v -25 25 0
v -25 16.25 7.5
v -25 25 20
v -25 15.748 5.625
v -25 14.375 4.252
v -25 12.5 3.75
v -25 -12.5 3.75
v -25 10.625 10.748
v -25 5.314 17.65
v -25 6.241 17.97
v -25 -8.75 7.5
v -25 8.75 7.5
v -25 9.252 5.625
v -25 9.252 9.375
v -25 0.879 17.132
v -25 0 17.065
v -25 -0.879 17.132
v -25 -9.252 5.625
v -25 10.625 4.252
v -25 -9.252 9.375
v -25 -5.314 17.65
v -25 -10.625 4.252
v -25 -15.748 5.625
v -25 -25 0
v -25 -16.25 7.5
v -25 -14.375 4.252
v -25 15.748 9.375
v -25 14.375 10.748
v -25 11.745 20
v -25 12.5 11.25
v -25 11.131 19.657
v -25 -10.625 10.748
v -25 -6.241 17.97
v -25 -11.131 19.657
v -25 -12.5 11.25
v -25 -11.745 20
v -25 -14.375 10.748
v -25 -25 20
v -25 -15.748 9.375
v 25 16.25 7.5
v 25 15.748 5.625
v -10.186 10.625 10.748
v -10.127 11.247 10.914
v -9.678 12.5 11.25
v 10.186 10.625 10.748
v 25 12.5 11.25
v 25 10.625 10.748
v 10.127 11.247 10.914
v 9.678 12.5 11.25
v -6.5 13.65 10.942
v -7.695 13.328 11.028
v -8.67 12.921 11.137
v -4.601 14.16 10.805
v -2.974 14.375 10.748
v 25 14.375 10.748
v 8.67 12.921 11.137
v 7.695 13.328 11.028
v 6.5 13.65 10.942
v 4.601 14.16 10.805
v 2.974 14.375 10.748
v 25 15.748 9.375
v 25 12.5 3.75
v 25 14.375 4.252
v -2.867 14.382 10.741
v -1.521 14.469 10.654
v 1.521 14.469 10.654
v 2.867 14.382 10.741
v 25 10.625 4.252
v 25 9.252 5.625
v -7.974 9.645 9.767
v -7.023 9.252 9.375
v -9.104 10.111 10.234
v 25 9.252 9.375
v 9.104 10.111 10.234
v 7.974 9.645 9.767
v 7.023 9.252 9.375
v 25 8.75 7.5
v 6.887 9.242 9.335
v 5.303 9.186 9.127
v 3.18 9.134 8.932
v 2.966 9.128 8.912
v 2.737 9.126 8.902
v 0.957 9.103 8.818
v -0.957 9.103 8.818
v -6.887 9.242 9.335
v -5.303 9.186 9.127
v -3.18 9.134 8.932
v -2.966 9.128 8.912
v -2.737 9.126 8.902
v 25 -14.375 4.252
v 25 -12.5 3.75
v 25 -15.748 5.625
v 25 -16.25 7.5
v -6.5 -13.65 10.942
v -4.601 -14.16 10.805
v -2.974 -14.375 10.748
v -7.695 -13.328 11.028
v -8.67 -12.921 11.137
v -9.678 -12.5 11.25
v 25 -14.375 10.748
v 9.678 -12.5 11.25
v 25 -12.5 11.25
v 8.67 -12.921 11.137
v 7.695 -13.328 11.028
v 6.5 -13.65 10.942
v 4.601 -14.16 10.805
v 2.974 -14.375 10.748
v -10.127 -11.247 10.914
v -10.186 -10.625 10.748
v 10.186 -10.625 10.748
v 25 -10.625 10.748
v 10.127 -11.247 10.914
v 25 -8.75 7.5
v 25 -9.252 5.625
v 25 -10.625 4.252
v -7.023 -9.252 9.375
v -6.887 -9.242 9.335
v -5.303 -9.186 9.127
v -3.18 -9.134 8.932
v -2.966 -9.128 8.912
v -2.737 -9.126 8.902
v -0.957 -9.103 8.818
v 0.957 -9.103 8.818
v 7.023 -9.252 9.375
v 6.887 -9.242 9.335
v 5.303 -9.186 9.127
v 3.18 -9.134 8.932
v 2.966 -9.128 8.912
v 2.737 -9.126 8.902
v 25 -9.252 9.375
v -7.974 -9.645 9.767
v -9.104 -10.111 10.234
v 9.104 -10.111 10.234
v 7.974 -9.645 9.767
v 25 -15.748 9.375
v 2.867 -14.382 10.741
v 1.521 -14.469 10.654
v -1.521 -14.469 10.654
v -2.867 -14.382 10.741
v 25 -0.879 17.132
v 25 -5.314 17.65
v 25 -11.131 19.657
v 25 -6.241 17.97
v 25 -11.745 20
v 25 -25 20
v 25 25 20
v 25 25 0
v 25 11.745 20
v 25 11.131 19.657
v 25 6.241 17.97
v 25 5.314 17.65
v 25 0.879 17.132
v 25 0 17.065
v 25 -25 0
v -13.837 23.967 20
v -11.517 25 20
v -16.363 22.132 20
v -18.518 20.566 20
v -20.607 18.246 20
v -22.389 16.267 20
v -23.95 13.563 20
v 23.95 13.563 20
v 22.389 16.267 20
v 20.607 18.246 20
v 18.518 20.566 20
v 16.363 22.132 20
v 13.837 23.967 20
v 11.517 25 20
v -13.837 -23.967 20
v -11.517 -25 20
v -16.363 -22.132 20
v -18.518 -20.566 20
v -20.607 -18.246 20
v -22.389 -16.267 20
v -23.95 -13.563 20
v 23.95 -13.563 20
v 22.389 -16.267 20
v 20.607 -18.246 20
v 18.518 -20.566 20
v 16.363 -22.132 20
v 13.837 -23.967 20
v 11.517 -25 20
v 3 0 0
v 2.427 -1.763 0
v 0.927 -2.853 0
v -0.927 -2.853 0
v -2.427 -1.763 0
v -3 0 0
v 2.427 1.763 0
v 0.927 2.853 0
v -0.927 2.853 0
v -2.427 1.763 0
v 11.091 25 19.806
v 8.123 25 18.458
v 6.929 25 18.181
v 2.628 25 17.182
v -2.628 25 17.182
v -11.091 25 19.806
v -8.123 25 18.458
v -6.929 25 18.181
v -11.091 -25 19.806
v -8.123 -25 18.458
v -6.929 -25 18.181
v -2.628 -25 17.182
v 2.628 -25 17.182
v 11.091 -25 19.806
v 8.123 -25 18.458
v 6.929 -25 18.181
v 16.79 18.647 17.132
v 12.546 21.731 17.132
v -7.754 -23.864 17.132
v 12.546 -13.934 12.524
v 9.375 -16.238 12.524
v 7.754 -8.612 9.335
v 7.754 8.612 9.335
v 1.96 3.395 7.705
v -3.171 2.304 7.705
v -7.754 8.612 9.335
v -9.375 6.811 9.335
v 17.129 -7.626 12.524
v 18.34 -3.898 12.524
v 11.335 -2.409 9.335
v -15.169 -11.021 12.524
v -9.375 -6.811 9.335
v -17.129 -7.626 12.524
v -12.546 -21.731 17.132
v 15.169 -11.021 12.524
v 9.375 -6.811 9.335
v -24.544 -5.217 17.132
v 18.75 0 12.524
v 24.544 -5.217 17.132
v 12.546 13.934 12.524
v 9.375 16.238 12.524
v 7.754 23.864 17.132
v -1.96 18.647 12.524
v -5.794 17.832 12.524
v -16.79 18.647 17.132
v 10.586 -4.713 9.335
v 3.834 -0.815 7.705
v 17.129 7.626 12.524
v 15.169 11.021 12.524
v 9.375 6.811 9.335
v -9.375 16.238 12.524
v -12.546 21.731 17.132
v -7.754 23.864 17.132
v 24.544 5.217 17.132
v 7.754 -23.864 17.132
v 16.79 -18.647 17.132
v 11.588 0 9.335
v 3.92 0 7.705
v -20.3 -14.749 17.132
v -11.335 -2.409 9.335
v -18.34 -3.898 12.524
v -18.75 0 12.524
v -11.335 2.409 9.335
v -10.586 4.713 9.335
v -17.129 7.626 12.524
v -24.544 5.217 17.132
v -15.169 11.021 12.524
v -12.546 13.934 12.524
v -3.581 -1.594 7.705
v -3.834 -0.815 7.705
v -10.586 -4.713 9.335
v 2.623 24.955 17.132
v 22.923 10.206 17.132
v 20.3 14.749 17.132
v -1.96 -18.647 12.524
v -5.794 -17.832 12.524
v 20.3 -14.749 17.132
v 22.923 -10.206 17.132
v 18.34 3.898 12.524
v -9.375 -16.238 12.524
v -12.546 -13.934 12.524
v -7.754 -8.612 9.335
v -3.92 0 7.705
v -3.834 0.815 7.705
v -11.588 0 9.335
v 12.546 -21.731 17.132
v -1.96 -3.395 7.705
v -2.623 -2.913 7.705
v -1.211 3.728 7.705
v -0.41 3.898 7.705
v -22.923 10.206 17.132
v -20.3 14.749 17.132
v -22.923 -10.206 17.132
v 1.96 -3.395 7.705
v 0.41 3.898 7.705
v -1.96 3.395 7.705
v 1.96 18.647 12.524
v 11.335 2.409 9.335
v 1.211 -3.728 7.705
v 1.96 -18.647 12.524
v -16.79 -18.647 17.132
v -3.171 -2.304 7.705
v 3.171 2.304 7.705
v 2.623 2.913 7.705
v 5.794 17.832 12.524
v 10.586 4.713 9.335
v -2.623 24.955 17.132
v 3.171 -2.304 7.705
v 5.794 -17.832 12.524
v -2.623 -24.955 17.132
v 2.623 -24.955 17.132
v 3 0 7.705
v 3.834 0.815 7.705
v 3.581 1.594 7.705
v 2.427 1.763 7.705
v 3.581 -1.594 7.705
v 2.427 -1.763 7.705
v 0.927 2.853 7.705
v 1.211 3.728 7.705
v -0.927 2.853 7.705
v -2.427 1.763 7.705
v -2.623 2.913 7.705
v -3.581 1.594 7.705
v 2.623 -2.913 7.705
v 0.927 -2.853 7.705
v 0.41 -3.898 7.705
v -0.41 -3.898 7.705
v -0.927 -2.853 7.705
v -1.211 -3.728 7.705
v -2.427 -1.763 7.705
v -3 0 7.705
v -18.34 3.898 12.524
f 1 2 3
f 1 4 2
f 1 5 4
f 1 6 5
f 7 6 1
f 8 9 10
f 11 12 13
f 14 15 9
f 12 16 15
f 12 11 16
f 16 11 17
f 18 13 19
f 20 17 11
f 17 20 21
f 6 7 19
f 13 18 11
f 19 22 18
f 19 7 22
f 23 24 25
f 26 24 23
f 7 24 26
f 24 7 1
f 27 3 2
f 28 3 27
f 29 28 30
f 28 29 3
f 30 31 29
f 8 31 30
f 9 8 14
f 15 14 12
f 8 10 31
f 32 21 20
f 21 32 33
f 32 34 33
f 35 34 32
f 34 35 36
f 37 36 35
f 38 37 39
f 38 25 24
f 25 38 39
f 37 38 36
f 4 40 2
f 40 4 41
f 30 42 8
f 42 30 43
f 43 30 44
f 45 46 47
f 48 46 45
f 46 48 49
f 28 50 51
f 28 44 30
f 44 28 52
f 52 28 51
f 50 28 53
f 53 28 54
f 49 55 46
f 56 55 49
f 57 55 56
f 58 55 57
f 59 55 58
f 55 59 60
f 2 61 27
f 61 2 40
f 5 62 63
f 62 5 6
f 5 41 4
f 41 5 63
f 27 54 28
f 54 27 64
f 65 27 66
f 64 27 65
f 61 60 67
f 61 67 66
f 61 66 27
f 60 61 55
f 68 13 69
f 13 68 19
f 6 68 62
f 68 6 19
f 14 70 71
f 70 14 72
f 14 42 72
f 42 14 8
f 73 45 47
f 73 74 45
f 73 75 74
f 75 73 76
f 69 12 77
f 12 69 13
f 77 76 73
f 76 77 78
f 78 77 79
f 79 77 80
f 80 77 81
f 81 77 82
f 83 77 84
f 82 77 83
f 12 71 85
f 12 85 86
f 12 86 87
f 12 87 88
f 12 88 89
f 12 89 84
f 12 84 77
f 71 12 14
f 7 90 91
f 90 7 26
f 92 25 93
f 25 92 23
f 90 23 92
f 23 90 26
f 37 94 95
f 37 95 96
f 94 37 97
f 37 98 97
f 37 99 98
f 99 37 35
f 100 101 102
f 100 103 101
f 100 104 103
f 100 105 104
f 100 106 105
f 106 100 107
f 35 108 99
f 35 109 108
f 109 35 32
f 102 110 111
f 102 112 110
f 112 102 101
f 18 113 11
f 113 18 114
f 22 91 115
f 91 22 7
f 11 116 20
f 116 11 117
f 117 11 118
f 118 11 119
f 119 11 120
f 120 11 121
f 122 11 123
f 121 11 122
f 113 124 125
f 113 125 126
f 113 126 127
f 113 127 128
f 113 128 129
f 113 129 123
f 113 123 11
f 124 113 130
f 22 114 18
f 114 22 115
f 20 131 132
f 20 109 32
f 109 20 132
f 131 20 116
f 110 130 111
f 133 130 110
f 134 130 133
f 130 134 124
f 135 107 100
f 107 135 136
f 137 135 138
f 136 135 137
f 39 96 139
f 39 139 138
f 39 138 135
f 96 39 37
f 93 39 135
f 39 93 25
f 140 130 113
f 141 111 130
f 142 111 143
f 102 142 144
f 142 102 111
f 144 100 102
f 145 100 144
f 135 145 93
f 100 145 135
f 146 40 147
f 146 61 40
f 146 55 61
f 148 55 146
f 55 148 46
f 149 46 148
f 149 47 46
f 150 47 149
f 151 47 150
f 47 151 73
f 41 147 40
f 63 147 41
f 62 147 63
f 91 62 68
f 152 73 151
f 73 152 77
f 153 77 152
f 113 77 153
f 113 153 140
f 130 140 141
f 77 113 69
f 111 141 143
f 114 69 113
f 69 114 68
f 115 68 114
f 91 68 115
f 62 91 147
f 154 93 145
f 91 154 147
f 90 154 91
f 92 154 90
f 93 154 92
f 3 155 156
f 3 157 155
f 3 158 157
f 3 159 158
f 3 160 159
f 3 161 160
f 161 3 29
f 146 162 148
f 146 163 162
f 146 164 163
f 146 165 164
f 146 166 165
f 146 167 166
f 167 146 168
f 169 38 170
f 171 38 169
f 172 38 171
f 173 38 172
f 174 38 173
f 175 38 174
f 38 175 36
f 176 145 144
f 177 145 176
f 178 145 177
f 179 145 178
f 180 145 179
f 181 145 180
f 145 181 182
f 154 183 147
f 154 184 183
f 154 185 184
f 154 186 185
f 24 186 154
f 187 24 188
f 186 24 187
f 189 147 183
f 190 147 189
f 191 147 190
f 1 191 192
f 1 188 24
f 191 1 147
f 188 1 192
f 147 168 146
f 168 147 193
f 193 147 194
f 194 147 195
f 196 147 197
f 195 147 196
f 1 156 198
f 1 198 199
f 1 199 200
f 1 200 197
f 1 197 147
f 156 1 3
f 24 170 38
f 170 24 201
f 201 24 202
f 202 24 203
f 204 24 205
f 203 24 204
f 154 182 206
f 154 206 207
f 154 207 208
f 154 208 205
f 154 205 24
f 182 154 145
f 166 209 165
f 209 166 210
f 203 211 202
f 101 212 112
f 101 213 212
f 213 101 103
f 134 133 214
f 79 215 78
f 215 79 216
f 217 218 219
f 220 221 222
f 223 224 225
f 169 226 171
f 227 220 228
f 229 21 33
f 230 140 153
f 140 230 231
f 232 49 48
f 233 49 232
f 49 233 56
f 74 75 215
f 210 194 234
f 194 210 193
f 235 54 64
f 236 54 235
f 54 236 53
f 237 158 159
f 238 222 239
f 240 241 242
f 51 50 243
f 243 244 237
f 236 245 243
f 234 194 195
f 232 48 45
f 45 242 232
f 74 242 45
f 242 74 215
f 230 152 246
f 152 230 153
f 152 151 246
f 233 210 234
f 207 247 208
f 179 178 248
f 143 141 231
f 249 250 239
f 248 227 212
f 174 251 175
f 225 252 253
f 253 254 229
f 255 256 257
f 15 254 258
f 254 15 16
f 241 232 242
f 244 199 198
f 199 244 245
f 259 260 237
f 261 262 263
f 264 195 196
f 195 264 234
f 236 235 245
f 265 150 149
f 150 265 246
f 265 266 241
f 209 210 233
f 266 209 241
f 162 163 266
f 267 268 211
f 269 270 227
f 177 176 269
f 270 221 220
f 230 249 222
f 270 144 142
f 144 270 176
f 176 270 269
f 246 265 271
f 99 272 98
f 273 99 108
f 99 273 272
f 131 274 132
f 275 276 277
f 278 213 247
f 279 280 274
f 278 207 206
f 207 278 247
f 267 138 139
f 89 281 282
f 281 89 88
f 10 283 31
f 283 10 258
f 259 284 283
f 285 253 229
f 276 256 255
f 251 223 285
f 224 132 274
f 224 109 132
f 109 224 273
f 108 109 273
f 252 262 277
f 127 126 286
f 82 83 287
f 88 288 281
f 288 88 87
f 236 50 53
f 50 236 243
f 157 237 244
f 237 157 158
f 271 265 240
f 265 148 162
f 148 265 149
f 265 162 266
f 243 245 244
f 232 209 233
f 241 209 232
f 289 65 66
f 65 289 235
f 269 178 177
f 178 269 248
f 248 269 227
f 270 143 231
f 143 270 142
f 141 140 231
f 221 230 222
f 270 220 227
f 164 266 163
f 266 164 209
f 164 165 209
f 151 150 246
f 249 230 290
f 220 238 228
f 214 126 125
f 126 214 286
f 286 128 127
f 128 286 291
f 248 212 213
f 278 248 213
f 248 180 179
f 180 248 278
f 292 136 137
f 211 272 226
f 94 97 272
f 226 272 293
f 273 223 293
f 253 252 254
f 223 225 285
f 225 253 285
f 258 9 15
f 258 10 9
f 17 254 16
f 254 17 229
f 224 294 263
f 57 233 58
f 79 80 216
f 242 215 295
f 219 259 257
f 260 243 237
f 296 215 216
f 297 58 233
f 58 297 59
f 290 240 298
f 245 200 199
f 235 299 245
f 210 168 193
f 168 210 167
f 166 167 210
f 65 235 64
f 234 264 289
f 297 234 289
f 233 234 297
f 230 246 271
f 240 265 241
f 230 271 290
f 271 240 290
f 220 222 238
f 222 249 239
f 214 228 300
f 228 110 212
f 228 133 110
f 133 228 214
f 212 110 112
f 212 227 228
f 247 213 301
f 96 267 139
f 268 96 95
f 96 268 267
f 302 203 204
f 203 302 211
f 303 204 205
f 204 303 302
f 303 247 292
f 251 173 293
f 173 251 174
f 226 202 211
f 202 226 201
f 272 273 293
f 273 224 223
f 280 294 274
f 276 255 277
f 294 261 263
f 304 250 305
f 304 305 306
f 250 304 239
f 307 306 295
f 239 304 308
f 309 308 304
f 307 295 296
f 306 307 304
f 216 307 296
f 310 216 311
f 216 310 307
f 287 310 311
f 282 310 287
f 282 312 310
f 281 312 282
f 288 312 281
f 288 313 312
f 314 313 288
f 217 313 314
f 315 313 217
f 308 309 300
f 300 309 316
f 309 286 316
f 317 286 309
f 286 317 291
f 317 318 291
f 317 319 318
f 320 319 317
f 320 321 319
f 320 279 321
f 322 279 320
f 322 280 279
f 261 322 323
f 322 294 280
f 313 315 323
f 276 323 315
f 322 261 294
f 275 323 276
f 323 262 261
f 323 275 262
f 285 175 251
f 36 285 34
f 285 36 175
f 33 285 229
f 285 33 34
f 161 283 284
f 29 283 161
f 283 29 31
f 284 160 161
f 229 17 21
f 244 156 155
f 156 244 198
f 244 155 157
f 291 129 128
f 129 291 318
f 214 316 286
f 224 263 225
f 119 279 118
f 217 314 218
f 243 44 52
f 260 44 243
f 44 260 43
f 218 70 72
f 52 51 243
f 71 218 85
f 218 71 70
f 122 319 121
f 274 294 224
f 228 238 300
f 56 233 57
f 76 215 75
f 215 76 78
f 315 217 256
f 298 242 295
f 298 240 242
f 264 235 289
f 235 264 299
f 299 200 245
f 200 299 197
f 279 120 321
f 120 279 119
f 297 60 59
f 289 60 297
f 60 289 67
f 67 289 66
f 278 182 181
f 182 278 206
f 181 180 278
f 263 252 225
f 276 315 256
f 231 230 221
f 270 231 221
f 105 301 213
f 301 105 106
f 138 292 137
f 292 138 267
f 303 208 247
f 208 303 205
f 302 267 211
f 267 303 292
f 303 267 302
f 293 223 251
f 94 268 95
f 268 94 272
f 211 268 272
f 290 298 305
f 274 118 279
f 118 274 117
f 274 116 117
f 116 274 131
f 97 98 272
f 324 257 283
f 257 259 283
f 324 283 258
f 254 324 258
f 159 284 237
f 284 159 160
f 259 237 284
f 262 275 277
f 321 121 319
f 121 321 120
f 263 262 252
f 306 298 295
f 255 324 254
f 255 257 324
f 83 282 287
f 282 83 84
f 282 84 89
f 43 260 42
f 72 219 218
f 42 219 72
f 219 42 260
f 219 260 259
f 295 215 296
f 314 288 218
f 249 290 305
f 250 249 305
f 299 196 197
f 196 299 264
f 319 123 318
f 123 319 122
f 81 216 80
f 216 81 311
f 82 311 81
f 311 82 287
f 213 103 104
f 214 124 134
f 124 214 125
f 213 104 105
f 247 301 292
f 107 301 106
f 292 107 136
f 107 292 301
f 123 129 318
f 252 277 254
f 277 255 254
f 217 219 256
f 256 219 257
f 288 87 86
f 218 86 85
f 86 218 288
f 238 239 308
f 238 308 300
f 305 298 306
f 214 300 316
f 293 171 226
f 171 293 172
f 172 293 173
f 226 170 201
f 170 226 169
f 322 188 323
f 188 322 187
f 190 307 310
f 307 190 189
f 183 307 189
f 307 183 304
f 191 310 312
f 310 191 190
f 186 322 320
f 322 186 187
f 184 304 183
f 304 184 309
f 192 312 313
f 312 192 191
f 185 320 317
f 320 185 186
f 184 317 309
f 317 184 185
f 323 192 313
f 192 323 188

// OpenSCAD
Thickness = 2; //[]
BaseLength = 50; //[]
BaseHeight = 20; //[]
sphereD = 75; //[]
SphereOffset = 25; //[]

difference() {
	translate(v = [0, 0, (BaseHeight / 2)]) {
		cube(center = true, size = [BaseLength, BaseLength, BaseHeight]);
	}
	translate(v = [0, 0, (SphereOffset + BaseHeight)]) {
		sphere(d = sphereD);
	}
	translate(v = [0, 0, (-BaseHeight)]) {
		cylinder(d = 6, h = (BaseHeight * 2));
	}
	union() {
		translate(v = [0, 0, 7.5000000000]) {
			translate(v = [0, (BaseLength / 4), 0]) {
				translate(v = [(-(BaseLength / 2)), 0, 0]) {
					rotate(a = [0, 90, 0]) {
						cylinder(d = 7.5000000000, h = (BaseLength * 2));
					}
				}
			}
		}
		translate(v = [0, (-(BaseLength / 2)), 0]) {
			translate(v = [0, 0, 7.5000000000]) {
				translate(v = [0, (BaseLength / 4), 0]) {
					translate(v = [(-(BaseLength / 2)), 0, 0]) {
						rotate(a = [0, 90, 0]) {
							cylinder(d = 7.5000000000, h = (BaseLength * 2));
						}
					}
				}
			}
		}
	}
}
